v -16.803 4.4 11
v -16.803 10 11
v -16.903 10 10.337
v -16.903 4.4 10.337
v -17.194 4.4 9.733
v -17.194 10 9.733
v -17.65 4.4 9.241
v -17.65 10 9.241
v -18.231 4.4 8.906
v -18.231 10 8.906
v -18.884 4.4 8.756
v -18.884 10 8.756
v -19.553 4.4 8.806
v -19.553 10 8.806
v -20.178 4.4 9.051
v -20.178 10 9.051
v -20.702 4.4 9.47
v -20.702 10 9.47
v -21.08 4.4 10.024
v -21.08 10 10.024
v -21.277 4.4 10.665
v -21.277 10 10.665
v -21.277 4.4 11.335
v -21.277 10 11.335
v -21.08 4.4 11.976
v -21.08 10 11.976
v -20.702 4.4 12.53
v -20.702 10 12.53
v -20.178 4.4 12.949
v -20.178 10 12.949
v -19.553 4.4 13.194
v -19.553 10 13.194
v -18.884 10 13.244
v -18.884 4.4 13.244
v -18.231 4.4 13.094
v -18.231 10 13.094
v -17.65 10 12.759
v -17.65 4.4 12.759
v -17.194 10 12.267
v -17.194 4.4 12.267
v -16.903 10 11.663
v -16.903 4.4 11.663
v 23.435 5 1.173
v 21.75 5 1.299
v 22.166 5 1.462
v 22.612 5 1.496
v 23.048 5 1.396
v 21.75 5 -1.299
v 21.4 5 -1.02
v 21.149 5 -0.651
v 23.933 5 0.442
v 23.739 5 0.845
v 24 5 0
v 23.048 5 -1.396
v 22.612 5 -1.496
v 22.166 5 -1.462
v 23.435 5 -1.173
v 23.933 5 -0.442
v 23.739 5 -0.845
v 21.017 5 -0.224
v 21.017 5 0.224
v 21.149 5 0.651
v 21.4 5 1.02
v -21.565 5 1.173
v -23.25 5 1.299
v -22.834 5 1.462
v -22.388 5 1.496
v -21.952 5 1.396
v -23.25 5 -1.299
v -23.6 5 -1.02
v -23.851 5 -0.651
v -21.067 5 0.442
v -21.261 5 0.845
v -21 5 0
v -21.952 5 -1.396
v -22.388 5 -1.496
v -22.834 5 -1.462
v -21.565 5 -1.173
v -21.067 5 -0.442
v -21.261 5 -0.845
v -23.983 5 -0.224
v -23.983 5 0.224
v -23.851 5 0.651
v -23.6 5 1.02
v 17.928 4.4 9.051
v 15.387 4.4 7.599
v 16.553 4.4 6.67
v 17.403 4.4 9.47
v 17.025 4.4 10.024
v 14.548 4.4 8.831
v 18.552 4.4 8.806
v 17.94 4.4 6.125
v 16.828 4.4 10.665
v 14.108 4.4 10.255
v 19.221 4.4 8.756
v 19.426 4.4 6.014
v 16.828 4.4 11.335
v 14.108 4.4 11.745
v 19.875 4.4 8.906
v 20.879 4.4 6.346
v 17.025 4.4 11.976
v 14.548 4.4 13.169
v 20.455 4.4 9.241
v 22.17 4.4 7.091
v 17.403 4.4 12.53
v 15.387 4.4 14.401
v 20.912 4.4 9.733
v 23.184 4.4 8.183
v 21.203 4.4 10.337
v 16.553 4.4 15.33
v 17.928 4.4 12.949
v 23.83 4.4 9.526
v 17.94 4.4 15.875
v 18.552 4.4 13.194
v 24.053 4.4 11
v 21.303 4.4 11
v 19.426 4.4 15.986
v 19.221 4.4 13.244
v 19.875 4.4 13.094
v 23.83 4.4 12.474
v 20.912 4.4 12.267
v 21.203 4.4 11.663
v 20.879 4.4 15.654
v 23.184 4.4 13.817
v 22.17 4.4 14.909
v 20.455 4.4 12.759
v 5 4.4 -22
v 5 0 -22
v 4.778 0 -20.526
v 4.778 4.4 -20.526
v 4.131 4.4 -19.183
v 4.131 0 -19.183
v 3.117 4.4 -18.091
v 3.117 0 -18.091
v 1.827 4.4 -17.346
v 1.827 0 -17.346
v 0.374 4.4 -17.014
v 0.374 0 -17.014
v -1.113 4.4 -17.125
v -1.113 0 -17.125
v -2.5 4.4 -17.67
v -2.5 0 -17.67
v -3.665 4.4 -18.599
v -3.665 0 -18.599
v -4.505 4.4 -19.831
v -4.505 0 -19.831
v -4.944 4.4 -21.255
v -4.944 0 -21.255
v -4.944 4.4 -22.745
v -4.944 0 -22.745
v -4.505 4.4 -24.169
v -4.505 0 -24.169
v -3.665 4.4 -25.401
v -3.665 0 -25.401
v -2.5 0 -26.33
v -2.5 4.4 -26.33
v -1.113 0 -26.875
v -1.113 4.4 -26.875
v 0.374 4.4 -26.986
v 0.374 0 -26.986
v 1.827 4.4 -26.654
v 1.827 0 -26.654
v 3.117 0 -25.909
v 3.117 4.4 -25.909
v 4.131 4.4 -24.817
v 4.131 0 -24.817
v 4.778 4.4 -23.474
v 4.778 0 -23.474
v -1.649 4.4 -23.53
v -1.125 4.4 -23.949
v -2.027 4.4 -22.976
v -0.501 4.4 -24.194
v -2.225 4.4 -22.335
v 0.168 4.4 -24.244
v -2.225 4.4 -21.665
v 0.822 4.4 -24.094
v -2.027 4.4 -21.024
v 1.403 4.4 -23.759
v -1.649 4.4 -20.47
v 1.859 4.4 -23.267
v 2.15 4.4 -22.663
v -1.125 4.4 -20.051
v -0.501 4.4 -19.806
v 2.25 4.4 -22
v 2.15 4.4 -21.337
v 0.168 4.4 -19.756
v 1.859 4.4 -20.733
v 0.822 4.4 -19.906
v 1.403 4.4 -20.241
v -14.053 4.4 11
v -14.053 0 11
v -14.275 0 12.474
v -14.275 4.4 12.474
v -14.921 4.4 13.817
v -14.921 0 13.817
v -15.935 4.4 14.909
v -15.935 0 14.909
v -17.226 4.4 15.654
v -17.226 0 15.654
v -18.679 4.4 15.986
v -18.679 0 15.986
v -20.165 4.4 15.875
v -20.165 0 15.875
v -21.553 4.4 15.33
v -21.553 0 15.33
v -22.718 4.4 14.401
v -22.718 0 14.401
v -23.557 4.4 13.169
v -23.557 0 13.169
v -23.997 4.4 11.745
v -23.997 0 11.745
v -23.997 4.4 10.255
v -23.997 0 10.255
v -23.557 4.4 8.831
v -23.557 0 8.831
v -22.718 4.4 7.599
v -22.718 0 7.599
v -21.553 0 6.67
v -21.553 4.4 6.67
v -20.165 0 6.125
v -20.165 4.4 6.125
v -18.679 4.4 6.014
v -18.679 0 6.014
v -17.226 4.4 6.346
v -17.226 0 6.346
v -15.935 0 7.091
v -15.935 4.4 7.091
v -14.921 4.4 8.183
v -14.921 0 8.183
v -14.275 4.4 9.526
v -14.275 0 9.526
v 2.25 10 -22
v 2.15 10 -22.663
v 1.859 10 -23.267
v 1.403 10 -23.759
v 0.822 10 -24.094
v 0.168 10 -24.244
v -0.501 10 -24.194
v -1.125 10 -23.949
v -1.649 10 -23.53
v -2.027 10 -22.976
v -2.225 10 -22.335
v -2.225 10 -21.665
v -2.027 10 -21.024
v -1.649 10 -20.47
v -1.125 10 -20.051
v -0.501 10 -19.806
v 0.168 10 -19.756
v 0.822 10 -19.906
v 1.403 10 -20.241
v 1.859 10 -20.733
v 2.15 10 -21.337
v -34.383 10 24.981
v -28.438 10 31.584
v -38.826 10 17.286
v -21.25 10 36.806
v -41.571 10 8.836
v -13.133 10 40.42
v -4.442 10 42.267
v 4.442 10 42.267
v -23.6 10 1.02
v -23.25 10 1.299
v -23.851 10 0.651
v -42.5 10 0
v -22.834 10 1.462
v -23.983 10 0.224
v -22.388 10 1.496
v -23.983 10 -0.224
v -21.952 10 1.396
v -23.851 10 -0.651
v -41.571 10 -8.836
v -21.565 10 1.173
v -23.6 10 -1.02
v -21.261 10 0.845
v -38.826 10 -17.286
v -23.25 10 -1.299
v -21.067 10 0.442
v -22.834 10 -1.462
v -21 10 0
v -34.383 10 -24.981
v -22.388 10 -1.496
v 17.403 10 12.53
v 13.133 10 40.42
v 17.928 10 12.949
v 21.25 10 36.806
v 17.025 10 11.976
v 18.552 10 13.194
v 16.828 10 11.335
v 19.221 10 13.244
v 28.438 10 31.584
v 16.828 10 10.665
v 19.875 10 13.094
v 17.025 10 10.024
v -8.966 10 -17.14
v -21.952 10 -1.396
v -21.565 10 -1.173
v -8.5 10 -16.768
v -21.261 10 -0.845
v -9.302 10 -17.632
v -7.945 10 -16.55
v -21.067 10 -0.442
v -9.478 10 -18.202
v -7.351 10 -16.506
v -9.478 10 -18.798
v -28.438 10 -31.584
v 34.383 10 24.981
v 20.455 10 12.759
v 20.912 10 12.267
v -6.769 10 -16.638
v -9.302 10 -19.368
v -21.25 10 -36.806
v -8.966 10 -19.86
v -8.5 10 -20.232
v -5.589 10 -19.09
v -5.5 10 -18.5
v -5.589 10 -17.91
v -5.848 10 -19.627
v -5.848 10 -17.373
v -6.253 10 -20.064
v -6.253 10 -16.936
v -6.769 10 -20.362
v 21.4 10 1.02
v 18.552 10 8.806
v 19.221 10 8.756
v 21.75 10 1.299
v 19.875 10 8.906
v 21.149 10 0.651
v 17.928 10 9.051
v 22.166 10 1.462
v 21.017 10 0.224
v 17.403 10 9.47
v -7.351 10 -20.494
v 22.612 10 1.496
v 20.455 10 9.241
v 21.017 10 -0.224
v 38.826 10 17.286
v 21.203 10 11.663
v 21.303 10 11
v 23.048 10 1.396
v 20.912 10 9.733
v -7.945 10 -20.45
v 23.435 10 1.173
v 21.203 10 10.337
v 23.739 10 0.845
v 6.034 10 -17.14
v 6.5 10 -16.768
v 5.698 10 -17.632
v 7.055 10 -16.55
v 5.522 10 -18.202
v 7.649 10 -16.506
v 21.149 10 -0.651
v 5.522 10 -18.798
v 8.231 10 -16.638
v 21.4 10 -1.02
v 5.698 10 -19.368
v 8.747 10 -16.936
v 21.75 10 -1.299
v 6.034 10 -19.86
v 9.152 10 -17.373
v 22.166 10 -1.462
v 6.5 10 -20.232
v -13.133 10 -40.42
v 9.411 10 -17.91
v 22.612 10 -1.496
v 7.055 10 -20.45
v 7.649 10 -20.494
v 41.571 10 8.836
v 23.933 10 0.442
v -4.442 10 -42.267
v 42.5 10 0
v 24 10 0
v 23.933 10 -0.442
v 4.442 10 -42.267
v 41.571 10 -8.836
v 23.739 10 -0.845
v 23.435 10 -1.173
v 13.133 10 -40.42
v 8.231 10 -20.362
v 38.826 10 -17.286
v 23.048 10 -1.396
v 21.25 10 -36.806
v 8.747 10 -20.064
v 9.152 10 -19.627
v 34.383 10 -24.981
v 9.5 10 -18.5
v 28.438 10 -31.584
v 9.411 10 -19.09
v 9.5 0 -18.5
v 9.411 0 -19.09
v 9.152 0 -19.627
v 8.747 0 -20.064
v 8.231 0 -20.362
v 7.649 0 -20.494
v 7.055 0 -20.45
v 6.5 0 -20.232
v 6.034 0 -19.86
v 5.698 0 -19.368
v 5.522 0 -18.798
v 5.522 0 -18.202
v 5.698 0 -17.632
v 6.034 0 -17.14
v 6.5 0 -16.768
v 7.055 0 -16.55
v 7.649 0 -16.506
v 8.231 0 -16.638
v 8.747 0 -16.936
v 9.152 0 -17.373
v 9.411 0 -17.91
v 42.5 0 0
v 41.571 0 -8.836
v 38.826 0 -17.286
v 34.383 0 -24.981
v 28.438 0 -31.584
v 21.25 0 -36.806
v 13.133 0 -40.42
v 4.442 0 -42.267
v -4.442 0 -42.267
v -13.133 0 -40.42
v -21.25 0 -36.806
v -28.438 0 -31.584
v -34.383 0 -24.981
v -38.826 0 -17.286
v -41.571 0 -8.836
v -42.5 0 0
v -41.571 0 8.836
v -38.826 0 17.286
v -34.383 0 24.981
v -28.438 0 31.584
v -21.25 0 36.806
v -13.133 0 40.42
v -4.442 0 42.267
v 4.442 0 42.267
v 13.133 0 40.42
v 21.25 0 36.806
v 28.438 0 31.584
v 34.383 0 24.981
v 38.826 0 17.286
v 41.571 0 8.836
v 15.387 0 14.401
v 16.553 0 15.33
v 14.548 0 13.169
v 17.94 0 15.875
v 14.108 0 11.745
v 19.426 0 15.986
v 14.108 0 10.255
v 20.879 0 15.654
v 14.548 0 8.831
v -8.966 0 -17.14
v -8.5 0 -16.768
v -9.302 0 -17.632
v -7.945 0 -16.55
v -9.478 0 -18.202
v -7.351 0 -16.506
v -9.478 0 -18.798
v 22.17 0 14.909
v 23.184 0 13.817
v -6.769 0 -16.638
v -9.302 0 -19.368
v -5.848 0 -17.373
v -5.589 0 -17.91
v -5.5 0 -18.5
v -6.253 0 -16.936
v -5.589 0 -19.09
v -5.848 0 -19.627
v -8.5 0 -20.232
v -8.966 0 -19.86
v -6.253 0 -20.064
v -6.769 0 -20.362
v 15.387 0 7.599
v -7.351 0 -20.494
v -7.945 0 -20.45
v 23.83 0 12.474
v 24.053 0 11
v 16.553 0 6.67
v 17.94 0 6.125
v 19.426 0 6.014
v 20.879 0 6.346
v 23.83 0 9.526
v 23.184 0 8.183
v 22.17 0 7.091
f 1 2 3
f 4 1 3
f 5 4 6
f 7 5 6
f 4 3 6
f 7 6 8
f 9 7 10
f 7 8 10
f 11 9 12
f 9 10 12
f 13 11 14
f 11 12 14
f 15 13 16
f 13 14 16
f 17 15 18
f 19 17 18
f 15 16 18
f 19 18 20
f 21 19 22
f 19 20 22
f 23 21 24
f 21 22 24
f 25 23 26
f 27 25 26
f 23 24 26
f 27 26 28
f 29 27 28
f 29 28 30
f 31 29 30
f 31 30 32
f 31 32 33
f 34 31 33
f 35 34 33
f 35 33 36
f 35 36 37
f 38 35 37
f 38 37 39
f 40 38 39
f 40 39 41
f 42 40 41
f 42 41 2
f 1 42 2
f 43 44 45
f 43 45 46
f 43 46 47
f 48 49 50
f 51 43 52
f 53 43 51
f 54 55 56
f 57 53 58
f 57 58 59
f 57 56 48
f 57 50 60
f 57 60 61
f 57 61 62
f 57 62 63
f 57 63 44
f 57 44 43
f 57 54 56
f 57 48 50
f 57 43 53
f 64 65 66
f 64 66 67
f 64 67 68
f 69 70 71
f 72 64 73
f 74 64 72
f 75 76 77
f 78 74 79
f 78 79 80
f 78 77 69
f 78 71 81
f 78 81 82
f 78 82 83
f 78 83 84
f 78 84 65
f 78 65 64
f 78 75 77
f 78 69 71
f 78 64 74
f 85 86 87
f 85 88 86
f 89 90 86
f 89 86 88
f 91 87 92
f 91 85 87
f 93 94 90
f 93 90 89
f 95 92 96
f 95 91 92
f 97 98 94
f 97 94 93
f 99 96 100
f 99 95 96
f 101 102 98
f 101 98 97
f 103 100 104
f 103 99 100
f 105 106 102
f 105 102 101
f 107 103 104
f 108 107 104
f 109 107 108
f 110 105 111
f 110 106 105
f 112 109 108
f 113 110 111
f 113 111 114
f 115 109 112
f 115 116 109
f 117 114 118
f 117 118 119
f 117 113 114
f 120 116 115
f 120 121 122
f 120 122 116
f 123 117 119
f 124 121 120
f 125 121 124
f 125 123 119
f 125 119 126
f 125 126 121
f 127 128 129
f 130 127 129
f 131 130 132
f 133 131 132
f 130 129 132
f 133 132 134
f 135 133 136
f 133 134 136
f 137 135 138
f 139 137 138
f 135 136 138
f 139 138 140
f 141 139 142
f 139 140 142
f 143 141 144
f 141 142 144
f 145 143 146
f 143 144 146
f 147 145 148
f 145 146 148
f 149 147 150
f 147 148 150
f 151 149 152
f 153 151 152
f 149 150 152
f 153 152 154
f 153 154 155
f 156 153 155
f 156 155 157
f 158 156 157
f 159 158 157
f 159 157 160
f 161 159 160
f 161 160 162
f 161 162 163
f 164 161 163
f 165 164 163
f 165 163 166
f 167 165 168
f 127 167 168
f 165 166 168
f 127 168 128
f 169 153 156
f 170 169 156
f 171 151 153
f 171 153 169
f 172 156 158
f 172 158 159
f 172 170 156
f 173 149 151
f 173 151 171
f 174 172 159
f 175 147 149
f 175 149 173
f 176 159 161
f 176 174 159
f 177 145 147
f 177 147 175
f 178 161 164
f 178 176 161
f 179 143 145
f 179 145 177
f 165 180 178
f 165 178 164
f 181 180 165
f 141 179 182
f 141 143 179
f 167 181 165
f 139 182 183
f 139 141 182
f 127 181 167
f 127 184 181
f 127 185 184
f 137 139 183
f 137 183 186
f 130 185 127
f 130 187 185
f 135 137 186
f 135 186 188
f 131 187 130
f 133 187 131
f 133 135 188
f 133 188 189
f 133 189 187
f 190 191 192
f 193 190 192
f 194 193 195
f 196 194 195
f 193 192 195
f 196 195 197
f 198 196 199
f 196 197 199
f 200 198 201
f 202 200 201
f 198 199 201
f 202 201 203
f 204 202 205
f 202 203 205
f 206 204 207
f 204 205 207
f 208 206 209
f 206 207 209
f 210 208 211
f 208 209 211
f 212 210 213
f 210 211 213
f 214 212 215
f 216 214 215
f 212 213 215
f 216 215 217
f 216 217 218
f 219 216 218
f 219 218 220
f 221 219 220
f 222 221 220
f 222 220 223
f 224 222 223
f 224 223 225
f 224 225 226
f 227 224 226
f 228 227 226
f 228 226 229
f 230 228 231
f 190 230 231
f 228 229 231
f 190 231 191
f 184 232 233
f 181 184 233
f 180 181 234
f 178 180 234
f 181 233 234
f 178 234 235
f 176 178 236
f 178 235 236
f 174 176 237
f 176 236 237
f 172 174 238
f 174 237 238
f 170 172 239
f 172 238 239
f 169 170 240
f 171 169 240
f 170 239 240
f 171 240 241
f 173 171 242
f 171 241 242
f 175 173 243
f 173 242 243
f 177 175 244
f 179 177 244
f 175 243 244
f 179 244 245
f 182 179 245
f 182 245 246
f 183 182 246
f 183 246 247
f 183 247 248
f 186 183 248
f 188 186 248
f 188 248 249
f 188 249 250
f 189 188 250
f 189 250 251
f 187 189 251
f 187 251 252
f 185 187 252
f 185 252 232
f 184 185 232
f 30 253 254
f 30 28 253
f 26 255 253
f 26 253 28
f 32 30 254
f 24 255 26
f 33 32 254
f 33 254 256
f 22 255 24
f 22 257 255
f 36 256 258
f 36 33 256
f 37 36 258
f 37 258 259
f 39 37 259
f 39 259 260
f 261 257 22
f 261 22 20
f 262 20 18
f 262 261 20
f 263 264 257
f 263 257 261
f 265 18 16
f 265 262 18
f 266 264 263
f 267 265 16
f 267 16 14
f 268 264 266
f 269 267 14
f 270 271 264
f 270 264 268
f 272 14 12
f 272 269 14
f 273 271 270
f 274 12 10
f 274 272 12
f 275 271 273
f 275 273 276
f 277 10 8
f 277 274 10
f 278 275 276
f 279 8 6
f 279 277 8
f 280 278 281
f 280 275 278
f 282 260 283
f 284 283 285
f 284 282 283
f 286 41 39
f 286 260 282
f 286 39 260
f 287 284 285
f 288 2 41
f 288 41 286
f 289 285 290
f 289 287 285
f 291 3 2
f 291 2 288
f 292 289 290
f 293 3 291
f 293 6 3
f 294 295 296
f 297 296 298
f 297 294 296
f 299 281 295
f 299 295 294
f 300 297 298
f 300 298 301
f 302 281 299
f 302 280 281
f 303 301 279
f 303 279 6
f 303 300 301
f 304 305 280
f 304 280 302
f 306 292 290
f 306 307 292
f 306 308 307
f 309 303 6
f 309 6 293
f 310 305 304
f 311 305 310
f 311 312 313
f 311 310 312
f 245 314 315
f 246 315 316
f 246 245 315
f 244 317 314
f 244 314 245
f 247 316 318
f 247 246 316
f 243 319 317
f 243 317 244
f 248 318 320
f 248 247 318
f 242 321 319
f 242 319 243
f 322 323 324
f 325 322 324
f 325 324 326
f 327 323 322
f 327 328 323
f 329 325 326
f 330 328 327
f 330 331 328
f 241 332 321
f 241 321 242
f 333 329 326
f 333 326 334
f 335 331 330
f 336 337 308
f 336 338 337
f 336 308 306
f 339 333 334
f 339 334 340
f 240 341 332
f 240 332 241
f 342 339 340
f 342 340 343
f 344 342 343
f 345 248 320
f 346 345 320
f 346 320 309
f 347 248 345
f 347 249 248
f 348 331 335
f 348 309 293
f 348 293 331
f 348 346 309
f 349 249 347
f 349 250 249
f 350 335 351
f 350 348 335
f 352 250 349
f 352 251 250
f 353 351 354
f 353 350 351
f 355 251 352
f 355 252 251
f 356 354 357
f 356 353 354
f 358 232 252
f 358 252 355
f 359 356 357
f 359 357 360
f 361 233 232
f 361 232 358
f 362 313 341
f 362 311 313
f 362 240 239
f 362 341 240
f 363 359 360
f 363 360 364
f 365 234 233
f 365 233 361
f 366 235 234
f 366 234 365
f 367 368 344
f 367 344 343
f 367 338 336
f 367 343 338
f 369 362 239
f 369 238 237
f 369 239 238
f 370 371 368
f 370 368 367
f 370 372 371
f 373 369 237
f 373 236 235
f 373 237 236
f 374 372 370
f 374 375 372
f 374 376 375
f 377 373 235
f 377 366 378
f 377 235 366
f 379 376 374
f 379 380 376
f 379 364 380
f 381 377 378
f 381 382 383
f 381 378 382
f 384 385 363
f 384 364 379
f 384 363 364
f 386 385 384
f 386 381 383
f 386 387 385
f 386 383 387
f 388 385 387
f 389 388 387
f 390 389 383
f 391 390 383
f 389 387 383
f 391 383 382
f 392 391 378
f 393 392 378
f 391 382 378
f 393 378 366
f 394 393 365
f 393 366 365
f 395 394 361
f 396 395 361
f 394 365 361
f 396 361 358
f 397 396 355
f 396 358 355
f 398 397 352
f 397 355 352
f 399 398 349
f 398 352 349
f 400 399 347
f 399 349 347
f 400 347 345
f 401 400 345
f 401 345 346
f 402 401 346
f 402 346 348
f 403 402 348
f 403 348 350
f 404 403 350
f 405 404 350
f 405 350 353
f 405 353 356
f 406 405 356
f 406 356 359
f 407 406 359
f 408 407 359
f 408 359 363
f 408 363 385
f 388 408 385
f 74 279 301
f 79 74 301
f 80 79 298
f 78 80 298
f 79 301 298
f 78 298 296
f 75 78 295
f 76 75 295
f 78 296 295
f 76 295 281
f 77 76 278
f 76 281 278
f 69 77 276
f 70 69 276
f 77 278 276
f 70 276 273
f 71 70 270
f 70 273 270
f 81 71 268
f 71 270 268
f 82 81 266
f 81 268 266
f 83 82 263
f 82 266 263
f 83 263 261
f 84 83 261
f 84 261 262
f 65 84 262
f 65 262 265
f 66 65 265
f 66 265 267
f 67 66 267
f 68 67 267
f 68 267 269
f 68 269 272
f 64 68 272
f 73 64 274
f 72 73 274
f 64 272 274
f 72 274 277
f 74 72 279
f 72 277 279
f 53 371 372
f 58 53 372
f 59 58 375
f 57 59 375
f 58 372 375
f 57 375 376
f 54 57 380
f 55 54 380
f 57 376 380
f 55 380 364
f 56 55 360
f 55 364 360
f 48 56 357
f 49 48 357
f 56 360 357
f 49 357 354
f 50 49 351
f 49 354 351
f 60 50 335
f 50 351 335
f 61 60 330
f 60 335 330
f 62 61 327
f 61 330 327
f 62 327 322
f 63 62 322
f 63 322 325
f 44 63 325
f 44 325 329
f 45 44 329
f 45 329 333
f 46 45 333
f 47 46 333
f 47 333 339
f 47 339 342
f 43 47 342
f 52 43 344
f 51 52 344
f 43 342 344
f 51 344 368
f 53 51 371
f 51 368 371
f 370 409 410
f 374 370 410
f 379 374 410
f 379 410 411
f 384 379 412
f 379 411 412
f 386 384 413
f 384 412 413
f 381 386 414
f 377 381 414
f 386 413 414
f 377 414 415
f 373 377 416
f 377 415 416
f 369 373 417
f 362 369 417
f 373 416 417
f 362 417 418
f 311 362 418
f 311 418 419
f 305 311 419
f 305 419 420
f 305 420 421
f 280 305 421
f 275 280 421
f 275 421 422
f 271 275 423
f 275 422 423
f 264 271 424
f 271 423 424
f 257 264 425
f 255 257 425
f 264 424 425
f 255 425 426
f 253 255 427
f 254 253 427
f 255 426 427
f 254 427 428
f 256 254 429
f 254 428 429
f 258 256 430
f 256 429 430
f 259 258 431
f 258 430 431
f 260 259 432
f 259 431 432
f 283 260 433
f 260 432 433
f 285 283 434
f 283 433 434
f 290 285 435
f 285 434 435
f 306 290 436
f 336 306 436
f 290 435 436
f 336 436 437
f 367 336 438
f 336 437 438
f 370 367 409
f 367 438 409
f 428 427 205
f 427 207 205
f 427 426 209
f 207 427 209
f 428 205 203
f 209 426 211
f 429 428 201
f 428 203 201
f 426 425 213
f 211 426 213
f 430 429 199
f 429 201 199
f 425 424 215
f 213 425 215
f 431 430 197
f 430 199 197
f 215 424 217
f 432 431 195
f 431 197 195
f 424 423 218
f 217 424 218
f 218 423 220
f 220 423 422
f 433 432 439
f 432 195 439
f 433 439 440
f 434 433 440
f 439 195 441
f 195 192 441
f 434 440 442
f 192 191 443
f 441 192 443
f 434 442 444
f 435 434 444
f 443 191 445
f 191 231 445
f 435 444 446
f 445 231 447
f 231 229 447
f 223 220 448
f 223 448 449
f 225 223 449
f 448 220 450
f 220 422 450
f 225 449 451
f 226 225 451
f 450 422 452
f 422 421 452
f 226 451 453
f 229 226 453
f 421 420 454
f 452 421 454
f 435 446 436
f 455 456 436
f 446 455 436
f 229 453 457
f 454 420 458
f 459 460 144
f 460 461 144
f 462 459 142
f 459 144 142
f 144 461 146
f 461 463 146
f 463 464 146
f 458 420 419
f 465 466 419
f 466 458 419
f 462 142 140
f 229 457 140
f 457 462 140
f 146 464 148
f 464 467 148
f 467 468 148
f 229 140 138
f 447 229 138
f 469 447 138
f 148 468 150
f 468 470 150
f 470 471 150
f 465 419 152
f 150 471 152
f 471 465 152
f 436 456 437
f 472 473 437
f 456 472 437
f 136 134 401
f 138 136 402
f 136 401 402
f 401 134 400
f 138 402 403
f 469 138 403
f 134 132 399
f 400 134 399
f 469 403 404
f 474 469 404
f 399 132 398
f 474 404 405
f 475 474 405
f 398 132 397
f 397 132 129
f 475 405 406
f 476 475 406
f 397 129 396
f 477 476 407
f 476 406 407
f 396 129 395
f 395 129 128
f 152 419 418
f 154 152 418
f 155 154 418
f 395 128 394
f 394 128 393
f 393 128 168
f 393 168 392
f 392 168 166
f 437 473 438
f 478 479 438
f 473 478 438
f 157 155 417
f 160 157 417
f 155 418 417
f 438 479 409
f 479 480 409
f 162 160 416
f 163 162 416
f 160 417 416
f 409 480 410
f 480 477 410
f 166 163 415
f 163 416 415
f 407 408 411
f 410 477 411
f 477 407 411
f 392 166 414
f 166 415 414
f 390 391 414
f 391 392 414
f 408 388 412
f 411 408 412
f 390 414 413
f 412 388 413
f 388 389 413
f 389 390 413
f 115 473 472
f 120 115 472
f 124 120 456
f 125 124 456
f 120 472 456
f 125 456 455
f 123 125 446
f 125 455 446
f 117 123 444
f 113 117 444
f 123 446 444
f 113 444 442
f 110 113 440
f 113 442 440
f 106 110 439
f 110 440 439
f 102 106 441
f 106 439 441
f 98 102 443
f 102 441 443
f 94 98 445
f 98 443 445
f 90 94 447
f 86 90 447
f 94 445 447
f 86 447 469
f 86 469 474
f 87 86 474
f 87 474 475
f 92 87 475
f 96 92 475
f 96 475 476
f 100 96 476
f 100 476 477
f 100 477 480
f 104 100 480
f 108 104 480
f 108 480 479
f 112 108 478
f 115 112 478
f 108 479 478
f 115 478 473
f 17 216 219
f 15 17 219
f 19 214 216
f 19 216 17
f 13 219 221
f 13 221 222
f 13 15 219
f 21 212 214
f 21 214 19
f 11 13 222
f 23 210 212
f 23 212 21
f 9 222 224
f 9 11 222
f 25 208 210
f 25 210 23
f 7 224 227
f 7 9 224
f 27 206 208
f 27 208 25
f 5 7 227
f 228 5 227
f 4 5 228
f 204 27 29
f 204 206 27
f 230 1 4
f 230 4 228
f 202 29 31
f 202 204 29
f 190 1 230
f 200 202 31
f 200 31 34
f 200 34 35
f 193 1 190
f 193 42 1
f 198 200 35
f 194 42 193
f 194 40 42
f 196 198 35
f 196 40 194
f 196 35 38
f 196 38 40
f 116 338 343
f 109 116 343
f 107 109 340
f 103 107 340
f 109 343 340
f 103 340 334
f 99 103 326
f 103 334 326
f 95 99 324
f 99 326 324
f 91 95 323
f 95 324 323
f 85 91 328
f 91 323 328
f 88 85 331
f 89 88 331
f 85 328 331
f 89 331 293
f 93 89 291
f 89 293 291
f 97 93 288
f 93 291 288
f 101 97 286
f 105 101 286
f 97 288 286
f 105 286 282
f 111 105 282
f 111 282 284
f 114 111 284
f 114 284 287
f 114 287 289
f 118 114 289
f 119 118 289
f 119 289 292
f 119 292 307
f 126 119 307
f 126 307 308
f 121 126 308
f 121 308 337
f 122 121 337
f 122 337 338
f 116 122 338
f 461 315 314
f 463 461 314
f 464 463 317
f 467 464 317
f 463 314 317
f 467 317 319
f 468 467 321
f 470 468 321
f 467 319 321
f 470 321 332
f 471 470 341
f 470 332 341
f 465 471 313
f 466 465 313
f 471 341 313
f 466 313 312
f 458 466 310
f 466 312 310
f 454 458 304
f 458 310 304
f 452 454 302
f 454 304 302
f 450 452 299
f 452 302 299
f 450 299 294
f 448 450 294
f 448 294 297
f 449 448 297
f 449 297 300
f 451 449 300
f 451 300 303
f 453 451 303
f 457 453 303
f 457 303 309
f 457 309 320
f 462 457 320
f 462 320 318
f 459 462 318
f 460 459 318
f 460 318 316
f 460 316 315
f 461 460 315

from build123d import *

# Parameters (mm, degrees)
SKETCH1_R           = 42.5
BOSS_EXTRUDE1_DEPTH = 10
SKETCH2_R           = 1.5
CUT_EXTRUDE1_DEPTH  = 5
SKETCH3_R           = 2.25
CUT_EXTRUDE2_DEPTH  = 11
SKETCH4_R           = 5
CUT_EXTRUDE3_DEPTH  = 4.4
SKETCH5_R           = 2
CUT_EXTRUDE4_DEPTH  = 11


with BuildPart() as part:
    # Sketch1 → Boss-Extrude1 (new body)
    with BuildSketch(Plane(origin=(0, 0, 0), x_dir=(1, 0, 0), z_dir=(0, 1, 0))):
        Circle(SKETCH1_R)
    extrude(amount=BOSS_EXTRUDE1_DEPTH)

    # Sketch2 → Cut-Extrude1 (cut)
    with BuildSketch(Plane(origin=(0, 10, 0), x_dir=(1, 0, 0), z_dir=(0, 1, 0))):
        with Locations((-22.5, 0)):
            Circle(SKETCH2_R)
        with Locations((22.5, 0)):
            Circle(SKETCH2_R)
    extrude(amount=-CUT_EXTRUDE1_DEPTH, mode=Mode.SUBTRACT)

    # Sketch3 → Cut-Extrude2 (cut, through all)
    with BuildSketch(Plane(origin=(0, 10, 0), x_dir=(1, 0, 0), z_dir=(0, 1, 0))):
        with Locations((0, 22)):
            Circle(SKETCH3_R)
        with Locations((19.052558883, -11)):
            Circle(SKETCH3_R)
        with Locations((-19.052558883, -11)):
            Circle(SKETCH3_R)
    extrude(amount=-CUT_EXTRUDE2_DEPTH, mode=Mode.SUBTRACT)

    # Sketch4 → Cut-Extrude3 (cut)
    with BuildSketch(Plane.XZ):
        with Locations((0, -22)):
            Circle(SKETCH4_R)
        with Locations((19.052558883, 11)):
            Circle(SKETCH4_R)
        with Locations((-19.052558883, 11)):
            Circle(SKETCH4_R)
    extrude(amount=-CUT_EXTRUDE3_DEPTH, mode=Mode.SUBTRACT)

    # Sketch5 → Cut-Extrude4 (cut, through all)
    with BuildSketch(Plane(origin=(0, 10, 0), x_dir=(1, 0, 0), z_dir=(0, 1, 0))):
        with Locations((-7.5, 18.5)):
            Circle(SKETCH5_R)
        with Locations((7.5, 18.5)):
            Circle(SKETCH5_R)
    extrude(amount=-CUT_EXTRUDE4_DEPTH, mode=Mode.SUBTRACT)


solid = part.part
